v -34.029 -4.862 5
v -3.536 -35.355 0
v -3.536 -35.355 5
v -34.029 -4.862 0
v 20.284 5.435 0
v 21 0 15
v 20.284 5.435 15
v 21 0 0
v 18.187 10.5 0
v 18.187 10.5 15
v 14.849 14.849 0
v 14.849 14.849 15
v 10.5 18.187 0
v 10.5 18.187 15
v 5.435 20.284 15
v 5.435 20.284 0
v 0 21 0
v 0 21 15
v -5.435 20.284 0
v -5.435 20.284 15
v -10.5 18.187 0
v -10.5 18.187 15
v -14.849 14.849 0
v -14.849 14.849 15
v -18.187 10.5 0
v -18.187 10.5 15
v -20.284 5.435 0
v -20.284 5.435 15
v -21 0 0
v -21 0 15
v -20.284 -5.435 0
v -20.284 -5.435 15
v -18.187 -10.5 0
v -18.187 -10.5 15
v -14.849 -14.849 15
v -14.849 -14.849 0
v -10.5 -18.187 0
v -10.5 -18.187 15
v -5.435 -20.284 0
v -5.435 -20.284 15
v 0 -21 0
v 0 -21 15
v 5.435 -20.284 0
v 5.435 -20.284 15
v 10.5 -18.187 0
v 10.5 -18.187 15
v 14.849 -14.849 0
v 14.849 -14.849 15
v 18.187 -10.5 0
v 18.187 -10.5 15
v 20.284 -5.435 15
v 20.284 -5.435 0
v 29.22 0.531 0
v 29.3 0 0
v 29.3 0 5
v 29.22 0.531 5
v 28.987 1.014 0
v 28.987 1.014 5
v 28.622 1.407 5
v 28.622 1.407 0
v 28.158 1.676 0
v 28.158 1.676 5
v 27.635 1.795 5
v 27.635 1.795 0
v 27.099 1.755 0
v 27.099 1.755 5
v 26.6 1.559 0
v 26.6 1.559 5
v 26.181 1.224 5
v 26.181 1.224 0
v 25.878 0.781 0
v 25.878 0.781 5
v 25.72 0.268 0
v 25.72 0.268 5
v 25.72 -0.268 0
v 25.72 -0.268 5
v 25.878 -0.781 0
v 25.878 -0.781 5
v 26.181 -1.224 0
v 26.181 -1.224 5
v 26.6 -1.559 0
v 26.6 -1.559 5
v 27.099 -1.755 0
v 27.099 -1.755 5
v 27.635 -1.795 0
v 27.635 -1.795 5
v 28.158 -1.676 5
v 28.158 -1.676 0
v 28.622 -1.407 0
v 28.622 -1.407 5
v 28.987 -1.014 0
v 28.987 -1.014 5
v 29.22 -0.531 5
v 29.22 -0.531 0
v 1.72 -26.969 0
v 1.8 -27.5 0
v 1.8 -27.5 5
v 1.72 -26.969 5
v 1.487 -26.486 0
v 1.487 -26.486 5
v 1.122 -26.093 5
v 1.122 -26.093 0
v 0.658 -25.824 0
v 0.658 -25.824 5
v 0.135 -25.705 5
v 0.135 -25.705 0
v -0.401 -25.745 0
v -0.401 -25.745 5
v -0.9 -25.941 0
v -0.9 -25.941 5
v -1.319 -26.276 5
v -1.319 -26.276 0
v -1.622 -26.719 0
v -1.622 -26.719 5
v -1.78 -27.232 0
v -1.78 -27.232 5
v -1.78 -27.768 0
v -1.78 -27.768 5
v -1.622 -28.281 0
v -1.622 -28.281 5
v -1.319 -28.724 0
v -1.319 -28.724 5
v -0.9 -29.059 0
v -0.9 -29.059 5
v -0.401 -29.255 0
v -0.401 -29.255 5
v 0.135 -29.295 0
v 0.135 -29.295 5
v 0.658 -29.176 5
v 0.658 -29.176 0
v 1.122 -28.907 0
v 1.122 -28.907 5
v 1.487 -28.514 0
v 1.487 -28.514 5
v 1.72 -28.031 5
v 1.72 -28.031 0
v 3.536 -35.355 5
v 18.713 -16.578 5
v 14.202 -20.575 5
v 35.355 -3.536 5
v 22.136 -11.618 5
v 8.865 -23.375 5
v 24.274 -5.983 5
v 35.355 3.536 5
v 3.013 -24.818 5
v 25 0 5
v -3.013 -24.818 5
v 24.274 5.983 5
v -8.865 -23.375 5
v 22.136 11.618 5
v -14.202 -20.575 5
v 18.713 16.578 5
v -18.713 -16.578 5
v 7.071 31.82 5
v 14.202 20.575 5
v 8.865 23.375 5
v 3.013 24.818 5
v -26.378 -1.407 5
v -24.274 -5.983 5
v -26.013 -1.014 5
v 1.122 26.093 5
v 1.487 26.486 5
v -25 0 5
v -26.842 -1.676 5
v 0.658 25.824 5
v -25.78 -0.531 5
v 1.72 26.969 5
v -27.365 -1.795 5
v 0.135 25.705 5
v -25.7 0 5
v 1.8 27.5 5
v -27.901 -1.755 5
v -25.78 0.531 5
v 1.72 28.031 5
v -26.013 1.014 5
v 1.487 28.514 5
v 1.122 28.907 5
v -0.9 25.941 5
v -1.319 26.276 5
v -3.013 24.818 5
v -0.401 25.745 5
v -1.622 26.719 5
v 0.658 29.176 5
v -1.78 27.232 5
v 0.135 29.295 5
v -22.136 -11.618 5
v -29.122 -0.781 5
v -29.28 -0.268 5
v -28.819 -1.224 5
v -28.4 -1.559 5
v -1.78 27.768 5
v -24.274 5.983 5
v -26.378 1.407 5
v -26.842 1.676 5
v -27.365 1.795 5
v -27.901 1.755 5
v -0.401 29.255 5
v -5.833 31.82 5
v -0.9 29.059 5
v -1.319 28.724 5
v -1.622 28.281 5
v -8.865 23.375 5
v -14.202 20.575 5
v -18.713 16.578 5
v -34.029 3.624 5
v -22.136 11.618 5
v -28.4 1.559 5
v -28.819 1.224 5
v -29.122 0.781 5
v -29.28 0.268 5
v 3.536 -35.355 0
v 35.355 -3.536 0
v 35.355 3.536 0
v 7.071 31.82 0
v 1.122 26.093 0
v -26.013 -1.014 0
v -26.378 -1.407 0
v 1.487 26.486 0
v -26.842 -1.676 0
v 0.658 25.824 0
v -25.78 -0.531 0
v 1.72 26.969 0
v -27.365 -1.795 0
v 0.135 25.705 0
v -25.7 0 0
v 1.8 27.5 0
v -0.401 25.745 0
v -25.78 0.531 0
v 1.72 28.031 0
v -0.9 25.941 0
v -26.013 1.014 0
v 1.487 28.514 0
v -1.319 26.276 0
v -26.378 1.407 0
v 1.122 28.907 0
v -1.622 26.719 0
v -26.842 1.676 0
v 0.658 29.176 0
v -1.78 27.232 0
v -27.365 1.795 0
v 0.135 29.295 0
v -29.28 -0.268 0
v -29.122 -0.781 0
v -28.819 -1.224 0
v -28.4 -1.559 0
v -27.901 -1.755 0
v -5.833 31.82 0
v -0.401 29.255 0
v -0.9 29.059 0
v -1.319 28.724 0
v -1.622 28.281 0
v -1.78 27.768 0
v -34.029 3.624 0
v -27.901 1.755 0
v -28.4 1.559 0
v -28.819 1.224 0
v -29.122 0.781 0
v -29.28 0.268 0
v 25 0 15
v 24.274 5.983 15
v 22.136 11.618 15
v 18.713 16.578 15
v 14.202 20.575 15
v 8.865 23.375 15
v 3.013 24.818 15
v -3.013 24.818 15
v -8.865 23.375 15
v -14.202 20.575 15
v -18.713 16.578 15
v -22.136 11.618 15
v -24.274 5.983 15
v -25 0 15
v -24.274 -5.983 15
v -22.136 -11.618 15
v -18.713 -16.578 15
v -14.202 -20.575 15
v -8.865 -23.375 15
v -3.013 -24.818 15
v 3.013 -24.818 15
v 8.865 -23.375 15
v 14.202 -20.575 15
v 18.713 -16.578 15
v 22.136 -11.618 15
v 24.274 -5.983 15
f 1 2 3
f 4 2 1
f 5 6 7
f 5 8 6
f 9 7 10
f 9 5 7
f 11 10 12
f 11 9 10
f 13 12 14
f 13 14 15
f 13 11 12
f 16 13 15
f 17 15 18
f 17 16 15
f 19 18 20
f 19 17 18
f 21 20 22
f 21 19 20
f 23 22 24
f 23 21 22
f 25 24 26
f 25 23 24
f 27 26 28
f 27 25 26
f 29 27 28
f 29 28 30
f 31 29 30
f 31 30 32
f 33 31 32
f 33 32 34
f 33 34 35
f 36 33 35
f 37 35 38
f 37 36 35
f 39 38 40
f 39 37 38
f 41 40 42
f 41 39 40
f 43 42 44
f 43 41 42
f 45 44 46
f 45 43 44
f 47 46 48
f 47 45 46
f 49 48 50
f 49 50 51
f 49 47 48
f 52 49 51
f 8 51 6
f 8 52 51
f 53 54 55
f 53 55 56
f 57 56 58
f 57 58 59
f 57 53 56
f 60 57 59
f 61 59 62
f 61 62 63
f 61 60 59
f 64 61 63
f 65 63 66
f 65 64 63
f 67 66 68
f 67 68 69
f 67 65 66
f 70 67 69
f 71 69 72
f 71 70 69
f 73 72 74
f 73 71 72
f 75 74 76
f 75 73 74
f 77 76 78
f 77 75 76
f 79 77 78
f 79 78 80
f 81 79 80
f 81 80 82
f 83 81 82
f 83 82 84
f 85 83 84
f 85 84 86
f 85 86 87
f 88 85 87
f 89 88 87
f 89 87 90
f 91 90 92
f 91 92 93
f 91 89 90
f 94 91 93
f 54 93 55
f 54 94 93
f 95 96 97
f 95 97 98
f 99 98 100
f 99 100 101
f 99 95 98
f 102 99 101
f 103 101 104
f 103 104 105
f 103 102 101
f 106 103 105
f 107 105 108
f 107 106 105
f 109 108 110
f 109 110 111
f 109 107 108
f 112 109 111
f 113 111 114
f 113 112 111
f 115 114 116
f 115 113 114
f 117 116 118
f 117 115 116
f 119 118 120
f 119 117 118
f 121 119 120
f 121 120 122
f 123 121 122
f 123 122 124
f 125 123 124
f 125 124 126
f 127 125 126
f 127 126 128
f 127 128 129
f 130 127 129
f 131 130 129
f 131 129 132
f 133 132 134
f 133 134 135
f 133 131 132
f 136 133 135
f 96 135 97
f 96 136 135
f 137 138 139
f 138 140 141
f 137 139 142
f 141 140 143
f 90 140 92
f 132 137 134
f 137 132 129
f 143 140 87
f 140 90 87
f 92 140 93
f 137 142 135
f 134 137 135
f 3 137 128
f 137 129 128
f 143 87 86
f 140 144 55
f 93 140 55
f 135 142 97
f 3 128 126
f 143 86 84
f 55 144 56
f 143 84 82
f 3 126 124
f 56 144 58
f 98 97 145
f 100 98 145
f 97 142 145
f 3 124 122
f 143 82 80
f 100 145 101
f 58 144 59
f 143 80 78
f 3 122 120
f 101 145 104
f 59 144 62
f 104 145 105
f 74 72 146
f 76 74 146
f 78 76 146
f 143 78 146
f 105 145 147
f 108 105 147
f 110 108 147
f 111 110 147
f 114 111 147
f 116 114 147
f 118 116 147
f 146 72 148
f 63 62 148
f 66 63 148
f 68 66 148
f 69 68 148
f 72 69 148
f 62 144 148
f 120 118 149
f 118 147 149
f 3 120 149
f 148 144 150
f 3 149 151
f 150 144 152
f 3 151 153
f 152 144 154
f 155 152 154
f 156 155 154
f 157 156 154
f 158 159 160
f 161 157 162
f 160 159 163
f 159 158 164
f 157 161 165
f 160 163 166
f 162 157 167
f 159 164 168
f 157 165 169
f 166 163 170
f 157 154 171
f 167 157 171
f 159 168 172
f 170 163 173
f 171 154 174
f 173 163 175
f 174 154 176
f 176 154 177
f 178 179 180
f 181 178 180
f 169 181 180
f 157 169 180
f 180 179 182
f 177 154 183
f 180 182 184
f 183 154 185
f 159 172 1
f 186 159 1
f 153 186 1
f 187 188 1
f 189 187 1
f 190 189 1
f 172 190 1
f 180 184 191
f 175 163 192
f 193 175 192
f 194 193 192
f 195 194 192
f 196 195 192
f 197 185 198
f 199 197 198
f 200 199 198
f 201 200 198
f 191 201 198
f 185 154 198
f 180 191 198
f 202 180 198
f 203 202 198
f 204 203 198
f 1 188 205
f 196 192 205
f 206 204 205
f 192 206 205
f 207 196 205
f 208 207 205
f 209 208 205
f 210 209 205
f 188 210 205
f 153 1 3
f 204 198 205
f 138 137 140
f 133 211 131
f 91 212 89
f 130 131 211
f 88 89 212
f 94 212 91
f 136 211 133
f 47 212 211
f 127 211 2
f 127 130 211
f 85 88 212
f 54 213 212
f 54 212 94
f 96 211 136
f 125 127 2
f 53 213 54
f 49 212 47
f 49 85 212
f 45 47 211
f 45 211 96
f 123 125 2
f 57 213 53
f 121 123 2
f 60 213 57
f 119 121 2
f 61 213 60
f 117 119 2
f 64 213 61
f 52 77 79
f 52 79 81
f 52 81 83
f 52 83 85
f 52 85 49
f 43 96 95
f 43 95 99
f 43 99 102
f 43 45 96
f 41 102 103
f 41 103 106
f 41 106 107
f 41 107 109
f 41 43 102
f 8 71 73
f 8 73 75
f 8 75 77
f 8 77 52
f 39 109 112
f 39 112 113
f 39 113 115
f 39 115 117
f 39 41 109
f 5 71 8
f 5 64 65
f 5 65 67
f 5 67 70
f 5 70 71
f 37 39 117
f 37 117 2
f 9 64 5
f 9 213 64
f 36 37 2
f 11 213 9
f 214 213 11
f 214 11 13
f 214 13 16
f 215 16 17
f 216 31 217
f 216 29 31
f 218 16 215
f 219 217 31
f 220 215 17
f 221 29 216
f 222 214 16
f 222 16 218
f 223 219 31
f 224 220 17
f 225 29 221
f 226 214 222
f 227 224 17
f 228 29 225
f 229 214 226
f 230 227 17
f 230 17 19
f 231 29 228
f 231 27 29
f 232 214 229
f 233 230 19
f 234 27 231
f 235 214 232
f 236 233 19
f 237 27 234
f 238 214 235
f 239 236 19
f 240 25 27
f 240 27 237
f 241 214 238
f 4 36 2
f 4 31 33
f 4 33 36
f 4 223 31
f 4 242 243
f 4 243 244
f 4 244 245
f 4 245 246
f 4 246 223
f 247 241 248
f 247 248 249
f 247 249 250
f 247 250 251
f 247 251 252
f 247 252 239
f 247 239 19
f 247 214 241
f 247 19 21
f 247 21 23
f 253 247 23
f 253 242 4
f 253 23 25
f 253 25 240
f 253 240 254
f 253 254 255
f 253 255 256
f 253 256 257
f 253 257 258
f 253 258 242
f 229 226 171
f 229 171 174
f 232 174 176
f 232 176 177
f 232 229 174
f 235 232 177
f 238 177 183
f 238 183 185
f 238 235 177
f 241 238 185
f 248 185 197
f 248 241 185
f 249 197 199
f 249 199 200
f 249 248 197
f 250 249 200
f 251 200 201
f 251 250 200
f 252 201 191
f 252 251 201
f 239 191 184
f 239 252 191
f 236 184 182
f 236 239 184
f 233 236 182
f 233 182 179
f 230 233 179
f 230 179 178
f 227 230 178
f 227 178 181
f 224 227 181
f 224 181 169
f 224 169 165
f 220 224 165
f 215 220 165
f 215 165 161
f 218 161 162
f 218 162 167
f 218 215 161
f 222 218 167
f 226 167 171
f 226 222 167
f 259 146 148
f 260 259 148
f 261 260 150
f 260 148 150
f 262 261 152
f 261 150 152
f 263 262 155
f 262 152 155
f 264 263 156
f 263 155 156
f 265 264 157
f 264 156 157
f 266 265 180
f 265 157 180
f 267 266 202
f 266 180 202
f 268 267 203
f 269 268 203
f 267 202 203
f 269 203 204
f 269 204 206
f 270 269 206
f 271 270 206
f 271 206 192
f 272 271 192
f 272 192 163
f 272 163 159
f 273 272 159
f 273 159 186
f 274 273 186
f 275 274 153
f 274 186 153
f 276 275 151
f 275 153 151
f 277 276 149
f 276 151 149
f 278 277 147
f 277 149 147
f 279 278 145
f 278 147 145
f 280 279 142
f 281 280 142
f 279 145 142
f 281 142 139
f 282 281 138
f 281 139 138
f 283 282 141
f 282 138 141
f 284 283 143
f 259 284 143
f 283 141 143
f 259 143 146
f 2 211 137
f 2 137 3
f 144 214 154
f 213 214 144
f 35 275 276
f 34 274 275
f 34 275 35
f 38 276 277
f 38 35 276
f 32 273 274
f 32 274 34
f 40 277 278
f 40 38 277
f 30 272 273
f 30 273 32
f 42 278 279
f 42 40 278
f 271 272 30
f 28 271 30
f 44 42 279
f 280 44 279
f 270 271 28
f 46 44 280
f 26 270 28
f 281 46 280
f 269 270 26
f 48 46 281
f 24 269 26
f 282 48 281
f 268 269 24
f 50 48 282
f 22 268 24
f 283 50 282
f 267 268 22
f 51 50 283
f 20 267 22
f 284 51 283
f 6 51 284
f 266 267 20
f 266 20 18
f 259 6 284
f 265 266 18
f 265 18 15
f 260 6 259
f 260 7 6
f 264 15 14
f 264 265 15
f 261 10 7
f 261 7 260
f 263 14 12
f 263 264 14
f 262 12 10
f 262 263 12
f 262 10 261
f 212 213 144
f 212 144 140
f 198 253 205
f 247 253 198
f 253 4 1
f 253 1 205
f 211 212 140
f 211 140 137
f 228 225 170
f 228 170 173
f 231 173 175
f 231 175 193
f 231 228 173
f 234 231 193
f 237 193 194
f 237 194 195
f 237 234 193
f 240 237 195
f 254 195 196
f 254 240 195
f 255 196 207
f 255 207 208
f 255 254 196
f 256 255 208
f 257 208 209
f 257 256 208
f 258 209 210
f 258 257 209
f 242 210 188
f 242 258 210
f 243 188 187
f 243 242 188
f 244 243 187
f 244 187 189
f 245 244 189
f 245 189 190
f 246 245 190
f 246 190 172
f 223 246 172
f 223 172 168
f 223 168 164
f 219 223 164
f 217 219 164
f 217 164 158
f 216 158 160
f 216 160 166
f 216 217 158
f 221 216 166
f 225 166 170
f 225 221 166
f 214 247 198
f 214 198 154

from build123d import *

# Parameters (mm, degrees)
SKETCH1_R           = 1.8
SKETCH1_R_2         = 21
BOSS_EXTRUDE1_DEPTH = 5
SKETCH2_R           = 25
SKETCH2_R_2         = 21
BOSS_EXTRUDE2_DEPTH = 10


with BuildPart() as part:
    # Sketch1 → Boss-Extrude1 (new body)
    with BuildSketch(Plane.XY):
        Polygon((-3.535533906, -35.355339059), (-34.029102601, -4.861770365), (-34.029102601, 3.62351101), (-5.832808457, 31.819805153), (7.071067812, 31.819805153), (35.355339059, 3.535533906), (35.355339059, -3.535533906), (3.535533906, -35.355339059), align=None)
        with Locations((27.5, 0)):
            Circle(SKETCH1_R, mode=Mode.SUBTRACT)
        with Locations((0, -27.5)):
            Circle(SKETCH1_R, mode=Mode.SUBTRACT)
        with Locations((0, 27.5)):
            Circle(SKETCH1_R, mode=Mode.SUBTRACT)
        Circle(SKETCH1_R_2, mode=Mode.SUBTRACT)
        with Locations((-27.5, 0)):
            Circle(SKETCH1_R, mode=Mode.SUBTRACT)
    extrude(amount=BOSS_EXTRUDE1_DEPTH)

    # Sketch2 → Boss-Extrude2 (add)
    with BuildSketch(Plane.XY.offset(5)):
        Circle(SKETCH2_R)
        Circle(SKETCH2_R_2, mode=Mode.SUBTRACT)
    extrude(amount=BOSS_EXTRUDE2_DEPTH)


solid = part.part
